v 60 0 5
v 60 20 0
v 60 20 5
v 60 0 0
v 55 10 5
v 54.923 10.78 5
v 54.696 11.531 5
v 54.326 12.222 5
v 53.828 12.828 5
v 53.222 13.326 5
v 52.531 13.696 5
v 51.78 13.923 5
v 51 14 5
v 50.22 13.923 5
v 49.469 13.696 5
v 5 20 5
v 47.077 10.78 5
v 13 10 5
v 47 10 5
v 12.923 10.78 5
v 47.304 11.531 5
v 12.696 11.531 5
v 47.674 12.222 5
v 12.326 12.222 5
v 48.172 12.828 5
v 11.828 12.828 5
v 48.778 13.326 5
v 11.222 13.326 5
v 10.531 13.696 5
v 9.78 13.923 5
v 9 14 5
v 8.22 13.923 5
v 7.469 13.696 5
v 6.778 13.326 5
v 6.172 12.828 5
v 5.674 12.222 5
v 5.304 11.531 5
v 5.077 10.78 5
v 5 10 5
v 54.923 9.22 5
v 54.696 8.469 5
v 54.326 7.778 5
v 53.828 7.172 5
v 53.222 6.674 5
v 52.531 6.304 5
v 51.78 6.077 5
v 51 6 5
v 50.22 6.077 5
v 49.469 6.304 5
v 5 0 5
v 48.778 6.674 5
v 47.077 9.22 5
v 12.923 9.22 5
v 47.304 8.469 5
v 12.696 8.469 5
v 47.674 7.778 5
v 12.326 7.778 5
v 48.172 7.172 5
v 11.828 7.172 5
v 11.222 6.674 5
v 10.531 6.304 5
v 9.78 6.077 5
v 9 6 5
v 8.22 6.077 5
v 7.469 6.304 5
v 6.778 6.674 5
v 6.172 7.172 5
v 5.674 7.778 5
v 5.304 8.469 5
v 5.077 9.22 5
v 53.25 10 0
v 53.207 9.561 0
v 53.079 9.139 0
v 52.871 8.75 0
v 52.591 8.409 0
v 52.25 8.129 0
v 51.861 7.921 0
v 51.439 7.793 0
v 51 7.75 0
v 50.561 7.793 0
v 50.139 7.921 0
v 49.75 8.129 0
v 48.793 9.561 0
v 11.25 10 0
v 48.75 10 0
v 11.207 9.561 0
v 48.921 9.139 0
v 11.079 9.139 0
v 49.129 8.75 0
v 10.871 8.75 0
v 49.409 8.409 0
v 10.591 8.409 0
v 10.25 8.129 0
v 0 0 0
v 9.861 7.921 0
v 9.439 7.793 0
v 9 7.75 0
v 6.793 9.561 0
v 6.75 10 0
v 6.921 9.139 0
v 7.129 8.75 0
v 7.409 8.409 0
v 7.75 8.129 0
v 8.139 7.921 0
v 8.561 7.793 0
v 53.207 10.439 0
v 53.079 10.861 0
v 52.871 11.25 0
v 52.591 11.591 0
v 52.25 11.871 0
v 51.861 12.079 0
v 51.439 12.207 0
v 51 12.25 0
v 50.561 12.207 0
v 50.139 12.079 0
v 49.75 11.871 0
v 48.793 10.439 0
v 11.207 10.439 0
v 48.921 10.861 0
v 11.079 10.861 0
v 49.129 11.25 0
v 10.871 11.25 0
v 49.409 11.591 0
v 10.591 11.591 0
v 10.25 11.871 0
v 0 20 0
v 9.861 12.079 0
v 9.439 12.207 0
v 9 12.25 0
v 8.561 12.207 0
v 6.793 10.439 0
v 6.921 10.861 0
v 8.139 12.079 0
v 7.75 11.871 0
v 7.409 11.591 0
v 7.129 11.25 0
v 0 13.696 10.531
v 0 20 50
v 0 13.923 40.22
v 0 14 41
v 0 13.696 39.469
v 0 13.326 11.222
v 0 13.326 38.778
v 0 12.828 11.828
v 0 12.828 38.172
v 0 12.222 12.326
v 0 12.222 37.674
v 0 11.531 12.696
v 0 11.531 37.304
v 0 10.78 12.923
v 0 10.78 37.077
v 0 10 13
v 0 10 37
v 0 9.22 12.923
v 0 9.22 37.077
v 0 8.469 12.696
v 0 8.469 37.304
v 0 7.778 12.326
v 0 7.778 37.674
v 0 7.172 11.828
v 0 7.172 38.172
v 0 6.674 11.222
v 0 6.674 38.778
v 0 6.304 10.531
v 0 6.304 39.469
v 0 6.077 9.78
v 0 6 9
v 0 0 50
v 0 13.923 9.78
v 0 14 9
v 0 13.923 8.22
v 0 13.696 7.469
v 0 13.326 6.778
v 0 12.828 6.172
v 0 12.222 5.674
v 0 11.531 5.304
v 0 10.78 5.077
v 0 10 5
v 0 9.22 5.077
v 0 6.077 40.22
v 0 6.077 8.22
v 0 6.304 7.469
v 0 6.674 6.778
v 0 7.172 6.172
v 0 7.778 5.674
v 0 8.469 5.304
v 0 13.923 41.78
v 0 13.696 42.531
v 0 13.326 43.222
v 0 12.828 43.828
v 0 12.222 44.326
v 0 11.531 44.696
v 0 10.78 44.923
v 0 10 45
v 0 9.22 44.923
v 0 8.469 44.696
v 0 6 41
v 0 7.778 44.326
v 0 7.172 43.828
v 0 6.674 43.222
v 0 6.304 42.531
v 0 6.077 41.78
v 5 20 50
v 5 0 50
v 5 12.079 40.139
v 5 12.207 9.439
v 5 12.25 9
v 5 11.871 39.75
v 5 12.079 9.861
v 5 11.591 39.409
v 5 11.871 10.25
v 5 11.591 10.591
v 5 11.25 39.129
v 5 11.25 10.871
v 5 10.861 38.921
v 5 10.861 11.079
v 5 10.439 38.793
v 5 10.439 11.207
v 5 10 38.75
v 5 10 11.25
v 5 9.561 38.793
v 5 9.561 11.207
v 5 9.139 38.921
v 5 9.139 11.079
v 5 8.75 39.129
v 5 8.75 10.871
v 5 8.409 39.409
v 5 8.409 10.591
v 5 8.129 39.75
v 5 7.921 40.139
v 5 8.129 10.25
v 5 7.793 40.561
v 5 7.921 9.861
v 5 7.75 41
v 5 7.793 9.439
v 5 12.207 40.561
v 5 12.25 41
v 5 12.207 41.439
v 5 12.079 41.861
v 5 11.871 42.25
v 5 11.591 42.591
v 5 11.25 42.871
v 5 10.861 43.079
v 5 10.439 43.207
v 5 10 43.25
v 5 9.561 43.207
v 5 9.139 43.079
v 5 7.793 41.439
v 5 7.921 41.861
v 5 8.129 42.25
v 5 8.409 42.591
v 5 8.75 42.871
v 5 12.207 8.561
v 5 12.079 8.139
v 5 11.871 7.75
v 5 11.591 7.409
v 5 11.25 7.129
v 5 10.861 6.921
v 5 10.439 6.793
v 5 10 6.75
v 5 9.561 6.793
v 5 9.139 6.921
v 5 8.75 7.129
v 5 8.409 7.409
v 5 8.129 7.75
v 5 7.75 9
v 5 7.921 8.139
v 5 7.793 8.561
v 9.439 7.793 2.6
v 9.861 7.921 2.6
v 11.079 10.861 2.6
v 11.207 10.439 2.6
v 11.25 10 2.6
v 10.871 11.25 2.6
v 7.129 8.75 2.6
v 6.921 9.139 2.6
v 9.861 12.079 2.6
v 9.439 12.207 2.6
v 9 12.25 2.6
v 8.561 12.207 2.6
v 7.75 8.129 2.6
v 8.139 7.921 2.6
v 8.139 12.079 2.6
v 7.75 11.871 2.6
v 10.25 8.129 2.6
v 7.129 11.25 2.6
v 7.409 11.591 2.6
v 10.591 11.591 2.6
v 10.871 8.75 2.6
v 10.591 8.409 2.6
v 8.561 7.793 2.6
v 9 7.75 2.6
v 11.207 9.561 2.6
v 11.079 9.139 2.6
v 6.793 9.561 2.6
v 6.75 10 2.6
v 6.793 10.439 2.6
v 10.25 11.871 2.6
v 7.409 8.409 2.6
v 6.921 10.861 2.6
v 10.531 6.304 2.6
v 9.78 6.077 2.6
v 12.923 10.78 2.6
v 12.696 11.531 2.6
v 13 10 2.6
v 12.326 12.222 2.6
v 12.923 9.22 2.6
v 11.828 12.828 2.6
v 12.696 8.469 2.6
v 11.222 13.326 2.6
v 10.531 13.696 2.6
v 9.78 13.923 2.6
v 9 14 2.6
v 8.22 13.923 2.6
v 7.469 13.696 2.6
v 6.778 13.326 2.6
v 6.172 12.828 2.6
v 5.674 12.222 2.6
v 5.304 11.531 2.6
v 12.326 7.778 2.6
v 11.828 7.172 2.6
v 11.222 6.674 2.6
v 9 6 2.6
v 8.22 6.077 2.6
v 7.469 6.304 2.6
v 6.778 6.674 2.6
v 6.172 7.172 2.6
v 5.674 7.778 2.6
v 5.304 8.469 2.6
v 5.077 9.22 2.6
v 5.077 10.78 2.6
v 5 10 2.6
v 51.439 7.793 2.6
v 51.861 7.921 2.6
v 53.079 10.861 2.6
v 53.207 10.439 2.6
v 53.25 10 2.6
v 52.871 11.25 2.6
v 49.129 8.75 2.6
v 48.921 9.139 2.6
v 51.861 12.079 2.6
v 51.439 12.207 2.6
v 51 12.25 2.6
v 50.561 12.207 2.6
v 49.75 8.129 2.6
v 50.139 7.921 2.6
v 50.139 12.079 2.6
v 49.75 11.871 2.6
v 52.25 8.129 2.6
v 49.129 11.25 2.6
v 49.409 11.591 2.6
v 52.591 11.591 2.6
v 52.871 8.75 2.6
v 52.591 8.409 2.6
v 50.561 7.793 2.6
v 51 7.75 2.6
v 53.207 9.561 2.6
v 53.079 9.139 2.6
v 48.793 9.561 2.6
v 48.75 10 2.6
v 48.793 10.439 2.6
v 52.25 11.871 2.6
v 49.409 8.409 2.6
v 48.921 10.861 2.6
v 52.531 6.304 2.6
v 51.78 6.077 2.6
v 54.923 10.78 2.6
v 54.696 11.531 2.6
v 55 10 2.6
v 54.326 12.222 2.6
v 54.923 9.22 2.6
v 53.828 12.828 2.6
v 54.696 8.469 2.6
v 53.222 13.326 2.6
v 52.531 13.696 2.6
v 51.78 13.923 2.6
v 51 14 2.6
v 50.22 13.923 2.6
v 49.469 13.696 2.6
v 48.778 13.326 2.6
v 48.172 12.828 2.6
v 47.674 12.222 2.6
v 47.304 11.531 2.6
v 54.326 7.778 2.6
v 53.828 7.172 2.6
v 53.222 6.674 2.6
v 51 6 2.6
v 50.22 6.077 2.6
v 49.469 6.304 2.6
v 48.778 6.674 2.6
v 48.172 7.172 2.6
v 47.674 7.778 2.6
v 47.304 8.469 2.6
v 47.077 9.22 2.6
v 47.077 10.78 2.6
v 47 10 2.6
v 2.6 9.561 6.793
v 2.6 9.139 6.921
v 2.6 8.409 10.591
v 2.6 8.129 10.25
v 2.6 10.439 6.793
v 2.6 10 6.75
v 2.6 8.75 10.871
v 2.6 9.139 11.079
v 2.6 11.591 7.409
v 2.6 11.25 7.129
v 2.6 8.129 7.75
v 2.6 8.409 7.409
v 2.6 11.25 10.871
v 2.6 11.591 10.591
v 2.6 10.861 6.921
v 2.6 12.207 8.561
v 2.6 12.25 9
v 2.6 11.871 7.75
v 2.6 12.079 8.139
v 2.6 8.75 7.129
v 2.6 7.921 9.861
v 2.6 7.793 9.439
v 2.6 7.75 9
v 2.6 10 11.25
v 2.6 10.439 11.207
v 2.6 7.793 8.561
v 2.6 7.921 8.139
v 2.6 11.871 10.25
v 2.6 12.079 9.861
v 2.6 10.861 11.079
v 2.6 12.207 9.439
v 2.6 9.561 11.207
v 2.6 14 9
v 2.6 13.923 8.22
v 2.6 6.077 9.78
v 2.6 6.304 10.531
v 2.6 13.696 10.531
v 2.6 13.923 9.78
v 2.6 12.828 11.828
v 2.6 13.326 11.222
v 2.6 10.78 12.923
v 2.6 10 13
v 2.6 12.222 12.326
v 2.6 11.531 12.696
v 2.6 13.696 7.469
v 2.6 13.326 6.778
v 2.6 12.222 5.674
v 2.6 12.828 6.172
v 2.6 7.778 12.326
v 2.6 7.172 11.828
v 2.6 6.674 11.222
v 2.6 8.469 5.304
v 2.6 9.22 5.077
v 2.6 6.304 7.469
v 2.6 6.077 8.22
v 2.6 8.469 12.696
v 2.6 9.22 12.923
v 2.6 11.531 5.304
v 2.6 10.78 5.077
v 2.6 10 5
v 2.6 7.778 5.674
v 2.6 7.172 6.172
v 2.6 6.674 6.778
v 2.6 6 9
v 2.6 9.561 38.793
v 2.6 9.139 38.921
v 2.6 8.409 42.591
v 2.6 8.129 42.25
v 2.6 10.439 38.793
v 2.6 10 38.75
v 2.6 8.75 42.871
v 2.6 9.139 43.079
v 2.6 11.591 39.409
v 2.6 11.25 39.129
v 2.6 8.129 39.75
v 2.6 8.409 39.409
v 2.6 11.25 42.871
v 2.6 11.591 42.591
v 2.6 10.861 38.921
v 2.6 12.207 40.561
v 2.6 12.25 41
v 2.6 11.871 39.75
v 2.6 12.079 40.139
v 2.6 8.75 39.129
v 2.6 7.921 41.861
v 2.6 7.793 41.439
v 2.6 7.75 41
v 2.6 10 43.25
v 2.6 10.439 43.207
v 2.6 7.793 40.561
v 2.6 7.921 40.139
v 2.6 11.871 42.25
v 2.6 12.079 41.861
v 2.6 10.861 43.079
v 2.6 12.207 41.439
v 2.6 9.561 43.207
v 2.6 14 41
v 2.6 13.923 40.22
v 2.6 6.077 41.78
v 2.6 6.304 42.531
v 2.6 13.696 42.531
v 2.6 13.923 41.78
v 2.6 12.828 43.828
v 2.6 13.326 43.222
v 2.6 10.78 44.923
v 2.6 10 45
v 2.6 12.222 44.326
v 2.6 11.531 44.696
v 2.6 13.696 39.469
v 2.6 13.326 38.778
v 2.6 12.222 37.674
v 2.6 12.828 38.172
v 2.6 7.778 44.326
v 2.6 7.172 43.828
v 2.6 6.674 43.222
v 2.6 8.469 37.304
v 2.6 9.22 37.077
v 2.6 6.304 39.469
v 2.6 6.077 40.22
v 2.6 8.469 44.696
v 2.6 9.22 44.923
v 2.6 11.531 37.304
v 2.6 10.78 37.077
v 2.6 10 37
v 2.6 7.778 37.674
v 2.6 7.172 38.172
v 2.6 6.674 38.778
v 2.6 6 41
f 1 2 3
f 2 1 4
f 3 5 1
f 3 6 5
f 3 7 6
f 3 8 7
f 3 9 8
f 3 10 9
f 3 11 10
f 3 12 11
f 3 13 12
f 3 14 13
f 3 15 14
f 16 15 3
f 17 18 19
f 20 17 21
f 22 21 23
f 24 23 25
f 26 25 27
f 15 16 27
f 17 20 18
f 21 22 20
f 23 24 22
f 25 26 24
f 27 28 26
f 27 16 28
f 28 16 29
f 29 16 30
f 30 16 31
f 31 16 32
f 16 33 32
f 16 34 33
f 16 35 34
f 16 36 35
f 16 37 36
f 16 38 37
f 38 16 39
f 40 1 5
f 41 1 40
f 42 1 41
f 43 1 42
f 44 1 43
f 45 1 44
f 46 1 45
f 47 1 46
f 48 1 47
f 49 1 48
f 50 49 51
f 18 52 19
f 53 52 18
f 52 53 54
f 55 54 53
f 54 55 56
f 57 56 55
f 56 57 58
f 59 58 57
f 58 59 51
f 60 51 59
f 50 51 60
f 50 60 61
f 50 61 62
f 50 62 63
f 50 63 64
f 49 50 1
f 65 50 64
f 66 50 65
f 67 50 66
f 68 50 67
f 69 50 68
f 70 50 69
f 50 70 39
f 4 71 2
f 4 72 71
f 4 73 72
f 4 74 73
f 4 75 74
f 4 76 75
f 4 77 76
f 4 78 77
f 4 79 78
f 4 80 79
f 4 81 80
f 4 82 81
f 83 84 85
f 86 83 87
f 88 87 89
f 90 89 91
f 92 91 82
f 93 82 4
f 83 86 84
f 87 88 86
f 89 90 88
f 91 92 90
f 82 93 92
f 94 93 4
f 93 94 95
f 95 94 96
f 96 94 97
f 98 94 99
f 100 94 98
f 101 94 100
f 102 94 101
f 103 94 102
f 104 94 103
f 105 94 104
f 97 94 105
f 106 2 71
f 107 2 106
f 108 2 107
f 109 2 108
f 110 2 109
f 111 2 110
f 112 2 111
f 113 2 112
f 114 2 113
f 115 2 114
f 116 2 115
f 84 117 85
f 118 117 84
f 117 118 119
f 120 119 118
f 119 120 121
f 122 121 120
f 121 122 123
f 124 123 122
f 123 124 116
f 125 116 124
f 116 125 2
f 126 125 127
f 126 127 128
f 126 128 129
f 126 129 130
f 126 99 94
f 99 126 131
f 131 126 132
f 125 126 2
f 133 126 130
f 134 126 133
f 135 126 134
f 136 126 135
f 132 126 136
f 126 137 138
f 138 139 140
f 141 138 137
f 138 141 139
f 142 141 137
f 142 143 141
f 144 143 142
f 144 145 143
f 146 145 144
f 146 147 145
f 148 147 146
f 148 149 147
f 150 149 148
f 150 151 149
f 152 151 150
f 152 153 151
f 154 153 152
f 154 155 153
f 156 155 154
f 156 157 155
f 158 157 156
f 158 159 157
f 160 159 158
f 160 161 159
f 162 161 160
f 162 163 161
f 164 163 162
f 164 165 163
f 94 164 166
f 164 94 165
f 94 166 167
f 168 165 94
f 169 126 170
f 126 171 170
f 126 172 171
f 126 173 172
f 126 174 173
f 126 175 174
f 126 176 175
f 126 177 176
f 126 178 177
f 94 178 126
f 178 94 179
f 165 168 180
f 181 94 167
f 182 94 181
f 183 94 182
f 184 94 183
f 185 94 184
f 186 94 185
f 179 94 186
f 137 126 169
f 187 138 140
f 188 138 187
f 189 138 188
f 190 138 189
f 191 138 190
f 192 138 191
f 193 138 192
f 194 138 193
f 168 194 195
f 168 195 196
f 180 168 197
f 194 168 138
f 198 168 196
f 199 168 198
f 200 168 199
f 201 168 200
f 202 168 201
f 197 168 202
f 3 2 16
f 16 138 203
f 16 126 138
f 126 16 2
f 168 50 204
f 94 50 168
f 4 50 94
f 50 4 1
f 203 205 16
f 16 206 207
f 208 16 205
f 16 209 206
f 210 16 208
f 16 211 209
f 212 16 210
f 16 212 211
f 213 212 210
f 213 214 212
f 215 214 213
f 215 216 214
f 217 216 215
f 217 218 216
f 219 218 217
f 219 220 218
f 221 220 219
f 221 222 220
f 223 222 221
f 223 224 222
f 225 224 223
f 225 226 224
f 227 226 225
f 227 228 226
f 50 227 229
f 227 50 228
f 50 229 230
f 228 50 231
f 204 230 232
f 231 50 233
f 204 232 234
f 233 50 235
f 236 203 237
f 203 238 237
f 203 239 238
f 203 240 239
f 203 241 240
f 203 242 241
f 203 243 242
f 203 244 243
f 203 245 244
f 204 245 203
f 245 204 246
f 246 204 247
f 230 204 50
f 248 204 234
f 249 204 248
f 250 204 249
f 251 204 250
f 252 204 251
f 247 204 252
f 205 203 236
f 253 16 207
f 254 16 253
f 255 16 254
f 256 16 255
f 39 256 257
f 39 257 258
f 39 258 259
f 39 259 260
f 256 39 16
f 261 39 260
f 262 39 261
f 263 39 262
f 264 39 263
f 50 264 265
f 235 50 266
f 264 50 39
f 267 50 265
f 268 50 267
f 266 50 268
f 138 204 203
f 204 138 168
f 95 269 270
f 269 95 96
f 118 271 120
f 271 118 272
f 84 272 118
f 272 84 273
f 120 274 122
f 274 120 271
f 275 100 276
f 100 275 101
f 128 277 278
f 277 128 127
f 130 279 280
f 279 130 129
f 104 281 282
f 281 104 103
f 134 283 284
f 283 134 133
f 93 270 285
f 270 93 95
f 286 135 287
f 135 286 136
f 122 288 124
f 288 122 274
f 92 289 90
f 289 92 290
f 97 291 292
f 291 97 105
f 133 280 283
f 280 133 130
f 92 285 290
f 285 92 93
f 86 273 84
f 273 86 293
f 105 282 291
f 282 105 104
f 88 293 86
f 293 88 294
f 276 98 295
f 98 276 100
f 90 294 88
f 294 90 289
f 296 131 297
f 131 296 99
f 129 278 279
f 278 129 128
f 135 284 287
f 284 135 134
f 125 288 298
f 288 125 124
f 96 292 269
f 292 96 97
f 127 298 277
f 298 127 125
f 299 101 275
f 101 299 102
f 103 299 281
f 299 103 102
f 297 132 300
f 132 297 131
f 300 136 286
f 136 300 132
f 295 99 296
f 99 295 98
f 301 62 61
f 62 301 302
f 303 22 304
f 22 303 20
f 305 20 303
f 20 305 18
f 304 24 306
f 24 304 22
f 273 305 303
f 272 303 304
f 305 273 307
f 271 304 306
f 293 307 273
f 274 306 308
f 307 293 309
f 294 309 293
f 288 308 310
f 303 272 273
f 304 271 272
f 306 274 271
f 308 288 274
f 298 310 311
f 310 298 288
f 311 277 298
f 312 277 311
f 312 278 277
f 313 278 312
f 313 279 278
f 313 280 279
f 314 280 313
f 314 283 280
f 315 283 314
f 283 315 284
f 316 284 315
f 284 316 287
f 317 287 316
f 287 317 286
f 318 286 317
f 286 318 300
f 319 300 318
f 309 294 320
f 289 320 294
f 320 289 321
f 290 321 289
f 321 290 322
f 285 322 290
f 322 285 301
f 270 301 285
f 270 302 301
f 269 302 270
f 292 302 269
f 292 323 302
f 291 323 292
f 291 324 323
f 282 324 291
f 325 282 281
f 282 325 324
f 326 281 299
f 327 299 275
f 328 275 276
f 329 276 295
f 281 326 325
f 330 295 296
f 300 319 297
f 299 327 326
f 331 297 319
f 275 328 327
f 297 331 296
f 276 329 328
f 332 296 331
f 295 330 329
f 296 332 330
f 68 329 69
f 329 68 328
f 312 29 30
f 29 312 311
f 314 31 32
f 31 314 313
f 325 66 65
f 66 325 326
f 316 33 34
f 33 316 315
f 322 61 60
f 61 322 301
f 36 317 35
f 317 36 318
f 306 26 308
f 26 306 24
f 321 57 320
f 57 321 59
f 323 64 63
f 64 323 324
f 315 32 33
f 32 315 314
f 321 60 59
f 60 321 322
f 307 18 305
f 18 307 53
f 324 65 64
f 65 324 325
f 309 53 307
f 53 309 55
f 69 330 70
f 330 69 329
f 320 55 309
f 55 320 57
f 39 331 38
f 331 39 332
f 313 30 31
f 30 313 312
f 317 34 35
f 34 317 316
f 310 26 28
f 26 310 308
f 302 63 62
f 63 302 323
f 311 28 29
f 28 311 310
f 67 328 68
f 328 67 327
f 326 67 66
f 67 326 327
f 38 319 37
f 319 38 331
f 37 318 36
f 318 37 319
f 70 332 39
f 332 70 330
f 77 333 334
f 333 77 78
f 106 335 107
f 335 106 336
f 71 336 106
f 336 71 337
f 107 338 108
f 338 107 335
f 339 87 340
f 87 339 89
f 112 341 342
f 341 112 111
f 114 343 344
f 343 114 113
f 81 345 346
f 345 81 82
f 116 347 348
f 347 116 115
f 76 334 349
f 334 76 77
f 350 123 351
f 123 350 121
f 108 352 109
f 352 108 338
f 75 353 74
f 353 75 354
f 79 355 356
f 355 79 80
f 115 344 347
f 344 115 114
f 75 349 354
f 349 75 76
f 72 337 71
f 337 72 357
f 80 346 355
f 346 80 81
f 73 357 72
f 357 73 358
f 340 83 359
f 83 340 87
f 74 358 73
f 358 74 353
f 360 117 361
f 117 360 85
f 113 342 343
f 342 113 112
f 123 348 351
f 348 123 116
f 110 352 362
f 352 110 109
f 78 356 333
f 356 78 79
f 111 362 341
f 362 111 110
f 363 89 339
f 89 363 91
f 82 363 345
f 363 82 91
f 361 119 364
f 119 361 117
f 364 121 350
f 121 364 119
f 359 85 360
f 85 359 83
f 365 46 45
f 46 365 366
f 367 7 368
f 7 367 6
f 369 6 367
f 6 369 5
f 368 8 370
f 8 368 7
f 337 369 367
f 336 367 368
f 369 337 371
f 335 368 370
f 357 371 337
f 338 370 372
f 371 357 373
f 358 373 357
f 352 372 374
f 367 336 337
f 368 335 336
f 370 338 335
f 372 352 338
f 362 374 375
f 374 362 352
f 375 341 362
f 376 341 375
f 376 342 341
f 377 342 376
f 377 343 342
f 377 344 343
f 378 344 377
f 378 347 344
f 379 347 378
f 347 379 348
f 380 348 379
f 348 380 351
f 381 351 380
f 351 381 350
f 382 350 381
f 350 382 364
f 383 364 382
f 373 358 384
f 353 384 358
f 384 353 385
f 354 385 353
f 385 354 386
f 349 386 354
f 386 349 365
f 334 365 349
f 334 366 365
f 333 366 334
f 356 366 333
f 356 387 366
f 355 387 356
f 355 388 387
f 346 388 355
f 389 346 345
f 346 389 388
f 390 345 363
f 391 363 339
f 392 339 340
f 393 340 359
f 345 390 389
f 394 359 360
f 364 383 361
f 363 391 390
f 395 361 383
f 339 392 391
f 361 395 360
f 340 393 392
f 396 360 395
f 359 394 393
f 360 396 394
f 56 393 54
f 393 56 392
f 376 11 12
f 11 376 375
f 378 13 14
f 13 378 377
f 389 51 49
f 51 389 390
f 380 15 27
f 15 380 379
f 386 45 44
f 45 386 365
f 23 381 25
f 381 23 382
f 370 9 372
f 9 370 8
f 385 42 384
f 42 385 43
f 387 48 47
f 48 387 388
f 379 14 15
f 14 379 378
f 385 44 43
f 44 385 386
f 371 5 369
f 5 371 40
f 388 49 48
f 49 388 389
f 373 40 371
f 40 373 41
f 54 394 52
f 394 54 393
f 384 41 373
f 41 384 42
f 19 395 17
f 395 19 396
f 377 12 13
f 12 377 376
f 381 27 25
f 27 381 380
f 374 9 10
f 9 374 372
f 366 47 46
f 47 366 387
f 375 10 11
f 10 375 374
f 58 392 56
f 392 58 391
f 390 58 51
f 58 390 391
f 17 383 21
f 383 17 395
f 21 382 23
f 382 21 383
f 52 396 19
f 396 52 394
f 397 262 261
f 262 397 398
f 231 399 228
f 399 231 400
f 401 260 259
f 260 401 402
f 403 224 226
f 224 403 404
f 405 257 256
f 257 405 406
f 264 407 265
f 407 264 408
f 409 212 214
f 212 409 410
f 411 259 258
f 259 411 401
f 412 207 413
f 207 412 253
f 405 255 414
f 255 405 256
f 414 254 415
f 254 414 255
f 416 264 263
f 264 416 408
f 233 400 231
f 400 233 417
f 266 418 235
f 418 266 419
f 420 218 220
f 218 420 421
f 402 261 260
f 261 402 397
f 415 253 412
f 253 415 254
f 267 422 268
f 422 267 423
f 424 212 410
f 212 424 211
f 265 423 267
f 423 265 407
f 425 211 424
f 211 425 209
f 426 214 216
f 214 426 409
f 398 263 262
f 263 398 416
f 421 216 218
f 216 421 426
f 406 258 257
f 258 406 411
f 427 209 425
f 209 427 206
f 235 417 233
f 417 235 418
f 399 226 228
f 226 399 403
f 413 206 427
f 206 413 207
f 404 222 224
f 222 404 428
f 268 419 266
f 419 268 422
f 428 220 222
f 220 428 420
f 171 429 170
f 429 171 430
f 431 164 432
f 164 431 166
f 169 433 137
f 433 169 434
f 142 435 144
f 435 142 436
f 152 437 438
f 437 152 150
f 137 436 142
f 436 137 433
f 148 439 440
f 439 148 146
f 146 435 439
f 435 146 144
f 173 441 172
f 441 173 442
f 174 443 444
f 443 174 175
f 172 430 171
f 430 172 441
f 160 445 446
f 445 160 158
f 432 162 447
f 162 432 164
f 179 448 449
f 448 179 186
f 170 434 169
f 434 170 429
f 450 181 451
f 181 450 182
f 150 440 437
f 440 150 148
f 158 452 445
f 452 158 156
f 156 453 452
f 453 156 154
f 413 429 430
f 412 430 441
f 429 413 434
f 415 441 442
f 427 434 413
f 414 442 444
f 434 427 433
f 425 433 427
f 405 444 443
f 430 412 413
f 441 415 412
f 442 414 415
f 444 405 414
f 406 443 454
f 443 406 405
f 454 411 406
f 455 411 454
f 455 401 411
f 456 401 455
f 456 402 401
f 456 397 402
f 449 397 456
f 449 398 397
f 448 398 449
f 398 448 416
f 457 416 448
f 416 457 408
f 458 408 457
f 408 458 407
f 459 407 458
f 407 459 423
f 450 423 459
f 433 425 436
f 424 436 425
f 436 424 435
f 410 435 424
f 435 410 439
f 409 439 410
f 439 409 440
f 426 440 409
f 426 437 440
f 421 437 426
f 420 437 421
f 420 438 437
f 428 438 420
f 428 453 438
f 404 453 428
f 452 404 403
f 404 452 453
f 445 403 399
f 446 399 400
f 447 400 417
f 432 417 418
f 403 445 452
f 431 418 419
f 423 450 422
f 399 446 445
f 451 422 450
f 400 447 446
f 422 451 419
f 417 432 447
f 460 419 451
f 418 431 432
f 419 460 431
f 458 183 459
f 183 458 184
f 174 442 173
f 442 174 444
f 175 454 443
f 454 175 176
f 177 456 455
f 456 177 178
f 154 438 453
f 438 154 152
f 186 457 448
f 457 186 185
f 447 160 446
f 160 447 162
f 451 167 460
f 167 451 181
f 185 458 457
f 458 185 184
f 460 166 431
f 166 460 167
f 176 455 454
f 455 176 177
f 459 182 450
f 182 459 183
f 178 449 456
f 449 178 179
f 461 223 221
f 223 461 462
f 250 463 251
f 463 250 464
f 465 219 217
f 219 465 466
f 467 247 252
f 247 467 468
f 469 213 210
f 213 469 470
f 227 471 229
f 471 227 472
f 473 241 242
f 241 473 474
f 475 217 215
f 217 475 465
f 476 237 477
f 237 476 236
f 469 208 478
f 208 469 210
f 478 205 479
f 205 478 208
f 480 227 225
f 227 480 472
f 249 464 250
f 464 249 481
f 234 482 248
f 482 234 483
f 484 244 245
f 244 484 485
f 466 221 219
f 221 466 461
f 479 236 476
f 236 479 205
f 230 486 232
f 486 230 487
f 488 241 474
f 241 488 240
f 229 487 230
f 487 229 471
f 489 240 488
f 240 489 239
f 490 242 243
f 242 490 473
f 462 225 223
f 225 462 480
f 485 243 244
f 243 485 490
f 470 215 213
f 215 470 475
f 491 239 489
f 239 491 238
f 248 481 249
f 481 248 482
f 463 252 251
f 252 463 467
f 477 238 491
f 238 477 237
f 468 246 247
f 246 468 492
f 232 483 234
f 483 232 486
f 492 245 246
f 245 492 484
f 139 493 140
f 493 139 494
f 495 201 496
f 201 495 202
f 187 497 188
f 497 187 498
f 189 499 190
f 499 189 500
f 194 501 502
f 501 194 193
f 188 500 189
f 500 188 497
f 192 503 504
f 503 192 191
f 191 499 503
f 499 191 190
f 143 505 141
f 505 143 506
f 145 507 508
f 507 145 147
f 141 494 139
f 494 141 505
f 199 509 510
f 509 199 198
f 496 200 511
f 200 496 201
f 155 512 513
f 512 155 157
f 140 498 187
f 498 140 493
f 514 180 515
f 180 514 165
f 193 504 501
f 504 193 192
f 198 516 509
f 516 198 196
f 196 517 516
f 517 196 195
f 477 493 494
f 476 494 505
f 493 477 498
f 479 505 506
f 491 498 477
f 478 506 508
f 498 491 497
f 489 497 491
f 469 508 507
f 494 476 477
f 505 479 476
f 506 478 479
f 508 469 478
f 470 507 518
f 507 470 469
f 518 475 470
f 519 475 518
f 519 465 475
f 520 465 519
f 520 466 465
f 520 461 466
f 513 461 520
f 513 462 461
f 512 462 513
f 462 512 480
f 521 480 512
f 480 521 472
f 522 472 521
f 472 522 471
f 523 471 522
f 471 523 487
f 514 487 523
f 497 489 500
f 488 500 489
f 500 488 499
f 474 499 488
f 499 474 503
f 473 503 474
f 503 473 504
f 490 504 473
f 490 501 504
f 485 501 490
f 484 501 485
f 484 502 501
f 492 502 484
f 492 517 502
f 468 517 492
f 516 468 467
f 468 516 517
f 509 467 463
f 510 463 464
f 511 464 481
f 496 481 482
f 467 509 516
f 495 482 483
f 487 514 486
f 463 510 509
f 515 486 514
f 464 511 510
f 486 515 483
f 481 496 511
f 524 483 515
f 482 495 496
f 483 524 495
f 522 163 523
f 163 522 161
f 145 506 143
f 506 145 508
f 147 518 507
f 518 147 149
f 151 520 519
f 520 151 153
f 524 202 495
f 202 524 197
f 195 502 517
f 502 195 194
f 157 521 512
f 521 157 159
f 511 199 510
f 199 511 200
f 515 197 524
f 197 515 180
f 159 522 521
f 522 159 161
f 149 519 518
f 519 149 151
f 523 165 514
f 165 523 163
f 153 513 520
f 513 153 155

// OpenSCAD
$fn = 32;

// ----------------------------------------------------------------------
// L-bracket: 60 x 20 x 50 mm
// ----------------------------------------------------------------------

// --- parameters (mm) ---
arm_x = 60;               // horizontal leg, X
arm_z = 50;               // vertical leg, Z
width = 20;               // bracket depth, Y
wall = 5;                 // plate thickness
hole_d = 4.5;             // clearance for M4
cb_d = 8;                 // counterbore seat
cb_h = 2.4;               // counterbore depth

module hole_z(px, py) {
  translate([px, py, -0.5]) cylinder(h = wall + 1, d = hole_d);
}
module hole_x(pz, py) {
  translate([-0.5, py, pz]) rotate([0, 90, 0]) cylinder(h = wall + 1, d = hole_d);
}
module cb_z(px, py) {
  translate([px, py, wall - cb_h]) cylinder(h = cb_h + 0.4, d = cb_d);
}
module cb_x(pz, py) {
  translate([wall - cb_h, py, pz]) rotate([0, -90, 0]) cylinder(h = cb_h + 0.4, d = cb_d);
}

difference() {
  union() {
    /* horizontal leg */
    cube([arm_x, width, wall]);
    /* vertical leg, overlapping the corner block */
    cube([wall, width, arm_z]);
  }
  hole_z(9, 10);
  cb_z(9, 10);
  hole_z(51, 10);
  cb_z(51, 10);
  hole_x(9, 10);
  cb_x(9, 10);
  hole_x(41, 10);
  cb_x(41, 10);
}
